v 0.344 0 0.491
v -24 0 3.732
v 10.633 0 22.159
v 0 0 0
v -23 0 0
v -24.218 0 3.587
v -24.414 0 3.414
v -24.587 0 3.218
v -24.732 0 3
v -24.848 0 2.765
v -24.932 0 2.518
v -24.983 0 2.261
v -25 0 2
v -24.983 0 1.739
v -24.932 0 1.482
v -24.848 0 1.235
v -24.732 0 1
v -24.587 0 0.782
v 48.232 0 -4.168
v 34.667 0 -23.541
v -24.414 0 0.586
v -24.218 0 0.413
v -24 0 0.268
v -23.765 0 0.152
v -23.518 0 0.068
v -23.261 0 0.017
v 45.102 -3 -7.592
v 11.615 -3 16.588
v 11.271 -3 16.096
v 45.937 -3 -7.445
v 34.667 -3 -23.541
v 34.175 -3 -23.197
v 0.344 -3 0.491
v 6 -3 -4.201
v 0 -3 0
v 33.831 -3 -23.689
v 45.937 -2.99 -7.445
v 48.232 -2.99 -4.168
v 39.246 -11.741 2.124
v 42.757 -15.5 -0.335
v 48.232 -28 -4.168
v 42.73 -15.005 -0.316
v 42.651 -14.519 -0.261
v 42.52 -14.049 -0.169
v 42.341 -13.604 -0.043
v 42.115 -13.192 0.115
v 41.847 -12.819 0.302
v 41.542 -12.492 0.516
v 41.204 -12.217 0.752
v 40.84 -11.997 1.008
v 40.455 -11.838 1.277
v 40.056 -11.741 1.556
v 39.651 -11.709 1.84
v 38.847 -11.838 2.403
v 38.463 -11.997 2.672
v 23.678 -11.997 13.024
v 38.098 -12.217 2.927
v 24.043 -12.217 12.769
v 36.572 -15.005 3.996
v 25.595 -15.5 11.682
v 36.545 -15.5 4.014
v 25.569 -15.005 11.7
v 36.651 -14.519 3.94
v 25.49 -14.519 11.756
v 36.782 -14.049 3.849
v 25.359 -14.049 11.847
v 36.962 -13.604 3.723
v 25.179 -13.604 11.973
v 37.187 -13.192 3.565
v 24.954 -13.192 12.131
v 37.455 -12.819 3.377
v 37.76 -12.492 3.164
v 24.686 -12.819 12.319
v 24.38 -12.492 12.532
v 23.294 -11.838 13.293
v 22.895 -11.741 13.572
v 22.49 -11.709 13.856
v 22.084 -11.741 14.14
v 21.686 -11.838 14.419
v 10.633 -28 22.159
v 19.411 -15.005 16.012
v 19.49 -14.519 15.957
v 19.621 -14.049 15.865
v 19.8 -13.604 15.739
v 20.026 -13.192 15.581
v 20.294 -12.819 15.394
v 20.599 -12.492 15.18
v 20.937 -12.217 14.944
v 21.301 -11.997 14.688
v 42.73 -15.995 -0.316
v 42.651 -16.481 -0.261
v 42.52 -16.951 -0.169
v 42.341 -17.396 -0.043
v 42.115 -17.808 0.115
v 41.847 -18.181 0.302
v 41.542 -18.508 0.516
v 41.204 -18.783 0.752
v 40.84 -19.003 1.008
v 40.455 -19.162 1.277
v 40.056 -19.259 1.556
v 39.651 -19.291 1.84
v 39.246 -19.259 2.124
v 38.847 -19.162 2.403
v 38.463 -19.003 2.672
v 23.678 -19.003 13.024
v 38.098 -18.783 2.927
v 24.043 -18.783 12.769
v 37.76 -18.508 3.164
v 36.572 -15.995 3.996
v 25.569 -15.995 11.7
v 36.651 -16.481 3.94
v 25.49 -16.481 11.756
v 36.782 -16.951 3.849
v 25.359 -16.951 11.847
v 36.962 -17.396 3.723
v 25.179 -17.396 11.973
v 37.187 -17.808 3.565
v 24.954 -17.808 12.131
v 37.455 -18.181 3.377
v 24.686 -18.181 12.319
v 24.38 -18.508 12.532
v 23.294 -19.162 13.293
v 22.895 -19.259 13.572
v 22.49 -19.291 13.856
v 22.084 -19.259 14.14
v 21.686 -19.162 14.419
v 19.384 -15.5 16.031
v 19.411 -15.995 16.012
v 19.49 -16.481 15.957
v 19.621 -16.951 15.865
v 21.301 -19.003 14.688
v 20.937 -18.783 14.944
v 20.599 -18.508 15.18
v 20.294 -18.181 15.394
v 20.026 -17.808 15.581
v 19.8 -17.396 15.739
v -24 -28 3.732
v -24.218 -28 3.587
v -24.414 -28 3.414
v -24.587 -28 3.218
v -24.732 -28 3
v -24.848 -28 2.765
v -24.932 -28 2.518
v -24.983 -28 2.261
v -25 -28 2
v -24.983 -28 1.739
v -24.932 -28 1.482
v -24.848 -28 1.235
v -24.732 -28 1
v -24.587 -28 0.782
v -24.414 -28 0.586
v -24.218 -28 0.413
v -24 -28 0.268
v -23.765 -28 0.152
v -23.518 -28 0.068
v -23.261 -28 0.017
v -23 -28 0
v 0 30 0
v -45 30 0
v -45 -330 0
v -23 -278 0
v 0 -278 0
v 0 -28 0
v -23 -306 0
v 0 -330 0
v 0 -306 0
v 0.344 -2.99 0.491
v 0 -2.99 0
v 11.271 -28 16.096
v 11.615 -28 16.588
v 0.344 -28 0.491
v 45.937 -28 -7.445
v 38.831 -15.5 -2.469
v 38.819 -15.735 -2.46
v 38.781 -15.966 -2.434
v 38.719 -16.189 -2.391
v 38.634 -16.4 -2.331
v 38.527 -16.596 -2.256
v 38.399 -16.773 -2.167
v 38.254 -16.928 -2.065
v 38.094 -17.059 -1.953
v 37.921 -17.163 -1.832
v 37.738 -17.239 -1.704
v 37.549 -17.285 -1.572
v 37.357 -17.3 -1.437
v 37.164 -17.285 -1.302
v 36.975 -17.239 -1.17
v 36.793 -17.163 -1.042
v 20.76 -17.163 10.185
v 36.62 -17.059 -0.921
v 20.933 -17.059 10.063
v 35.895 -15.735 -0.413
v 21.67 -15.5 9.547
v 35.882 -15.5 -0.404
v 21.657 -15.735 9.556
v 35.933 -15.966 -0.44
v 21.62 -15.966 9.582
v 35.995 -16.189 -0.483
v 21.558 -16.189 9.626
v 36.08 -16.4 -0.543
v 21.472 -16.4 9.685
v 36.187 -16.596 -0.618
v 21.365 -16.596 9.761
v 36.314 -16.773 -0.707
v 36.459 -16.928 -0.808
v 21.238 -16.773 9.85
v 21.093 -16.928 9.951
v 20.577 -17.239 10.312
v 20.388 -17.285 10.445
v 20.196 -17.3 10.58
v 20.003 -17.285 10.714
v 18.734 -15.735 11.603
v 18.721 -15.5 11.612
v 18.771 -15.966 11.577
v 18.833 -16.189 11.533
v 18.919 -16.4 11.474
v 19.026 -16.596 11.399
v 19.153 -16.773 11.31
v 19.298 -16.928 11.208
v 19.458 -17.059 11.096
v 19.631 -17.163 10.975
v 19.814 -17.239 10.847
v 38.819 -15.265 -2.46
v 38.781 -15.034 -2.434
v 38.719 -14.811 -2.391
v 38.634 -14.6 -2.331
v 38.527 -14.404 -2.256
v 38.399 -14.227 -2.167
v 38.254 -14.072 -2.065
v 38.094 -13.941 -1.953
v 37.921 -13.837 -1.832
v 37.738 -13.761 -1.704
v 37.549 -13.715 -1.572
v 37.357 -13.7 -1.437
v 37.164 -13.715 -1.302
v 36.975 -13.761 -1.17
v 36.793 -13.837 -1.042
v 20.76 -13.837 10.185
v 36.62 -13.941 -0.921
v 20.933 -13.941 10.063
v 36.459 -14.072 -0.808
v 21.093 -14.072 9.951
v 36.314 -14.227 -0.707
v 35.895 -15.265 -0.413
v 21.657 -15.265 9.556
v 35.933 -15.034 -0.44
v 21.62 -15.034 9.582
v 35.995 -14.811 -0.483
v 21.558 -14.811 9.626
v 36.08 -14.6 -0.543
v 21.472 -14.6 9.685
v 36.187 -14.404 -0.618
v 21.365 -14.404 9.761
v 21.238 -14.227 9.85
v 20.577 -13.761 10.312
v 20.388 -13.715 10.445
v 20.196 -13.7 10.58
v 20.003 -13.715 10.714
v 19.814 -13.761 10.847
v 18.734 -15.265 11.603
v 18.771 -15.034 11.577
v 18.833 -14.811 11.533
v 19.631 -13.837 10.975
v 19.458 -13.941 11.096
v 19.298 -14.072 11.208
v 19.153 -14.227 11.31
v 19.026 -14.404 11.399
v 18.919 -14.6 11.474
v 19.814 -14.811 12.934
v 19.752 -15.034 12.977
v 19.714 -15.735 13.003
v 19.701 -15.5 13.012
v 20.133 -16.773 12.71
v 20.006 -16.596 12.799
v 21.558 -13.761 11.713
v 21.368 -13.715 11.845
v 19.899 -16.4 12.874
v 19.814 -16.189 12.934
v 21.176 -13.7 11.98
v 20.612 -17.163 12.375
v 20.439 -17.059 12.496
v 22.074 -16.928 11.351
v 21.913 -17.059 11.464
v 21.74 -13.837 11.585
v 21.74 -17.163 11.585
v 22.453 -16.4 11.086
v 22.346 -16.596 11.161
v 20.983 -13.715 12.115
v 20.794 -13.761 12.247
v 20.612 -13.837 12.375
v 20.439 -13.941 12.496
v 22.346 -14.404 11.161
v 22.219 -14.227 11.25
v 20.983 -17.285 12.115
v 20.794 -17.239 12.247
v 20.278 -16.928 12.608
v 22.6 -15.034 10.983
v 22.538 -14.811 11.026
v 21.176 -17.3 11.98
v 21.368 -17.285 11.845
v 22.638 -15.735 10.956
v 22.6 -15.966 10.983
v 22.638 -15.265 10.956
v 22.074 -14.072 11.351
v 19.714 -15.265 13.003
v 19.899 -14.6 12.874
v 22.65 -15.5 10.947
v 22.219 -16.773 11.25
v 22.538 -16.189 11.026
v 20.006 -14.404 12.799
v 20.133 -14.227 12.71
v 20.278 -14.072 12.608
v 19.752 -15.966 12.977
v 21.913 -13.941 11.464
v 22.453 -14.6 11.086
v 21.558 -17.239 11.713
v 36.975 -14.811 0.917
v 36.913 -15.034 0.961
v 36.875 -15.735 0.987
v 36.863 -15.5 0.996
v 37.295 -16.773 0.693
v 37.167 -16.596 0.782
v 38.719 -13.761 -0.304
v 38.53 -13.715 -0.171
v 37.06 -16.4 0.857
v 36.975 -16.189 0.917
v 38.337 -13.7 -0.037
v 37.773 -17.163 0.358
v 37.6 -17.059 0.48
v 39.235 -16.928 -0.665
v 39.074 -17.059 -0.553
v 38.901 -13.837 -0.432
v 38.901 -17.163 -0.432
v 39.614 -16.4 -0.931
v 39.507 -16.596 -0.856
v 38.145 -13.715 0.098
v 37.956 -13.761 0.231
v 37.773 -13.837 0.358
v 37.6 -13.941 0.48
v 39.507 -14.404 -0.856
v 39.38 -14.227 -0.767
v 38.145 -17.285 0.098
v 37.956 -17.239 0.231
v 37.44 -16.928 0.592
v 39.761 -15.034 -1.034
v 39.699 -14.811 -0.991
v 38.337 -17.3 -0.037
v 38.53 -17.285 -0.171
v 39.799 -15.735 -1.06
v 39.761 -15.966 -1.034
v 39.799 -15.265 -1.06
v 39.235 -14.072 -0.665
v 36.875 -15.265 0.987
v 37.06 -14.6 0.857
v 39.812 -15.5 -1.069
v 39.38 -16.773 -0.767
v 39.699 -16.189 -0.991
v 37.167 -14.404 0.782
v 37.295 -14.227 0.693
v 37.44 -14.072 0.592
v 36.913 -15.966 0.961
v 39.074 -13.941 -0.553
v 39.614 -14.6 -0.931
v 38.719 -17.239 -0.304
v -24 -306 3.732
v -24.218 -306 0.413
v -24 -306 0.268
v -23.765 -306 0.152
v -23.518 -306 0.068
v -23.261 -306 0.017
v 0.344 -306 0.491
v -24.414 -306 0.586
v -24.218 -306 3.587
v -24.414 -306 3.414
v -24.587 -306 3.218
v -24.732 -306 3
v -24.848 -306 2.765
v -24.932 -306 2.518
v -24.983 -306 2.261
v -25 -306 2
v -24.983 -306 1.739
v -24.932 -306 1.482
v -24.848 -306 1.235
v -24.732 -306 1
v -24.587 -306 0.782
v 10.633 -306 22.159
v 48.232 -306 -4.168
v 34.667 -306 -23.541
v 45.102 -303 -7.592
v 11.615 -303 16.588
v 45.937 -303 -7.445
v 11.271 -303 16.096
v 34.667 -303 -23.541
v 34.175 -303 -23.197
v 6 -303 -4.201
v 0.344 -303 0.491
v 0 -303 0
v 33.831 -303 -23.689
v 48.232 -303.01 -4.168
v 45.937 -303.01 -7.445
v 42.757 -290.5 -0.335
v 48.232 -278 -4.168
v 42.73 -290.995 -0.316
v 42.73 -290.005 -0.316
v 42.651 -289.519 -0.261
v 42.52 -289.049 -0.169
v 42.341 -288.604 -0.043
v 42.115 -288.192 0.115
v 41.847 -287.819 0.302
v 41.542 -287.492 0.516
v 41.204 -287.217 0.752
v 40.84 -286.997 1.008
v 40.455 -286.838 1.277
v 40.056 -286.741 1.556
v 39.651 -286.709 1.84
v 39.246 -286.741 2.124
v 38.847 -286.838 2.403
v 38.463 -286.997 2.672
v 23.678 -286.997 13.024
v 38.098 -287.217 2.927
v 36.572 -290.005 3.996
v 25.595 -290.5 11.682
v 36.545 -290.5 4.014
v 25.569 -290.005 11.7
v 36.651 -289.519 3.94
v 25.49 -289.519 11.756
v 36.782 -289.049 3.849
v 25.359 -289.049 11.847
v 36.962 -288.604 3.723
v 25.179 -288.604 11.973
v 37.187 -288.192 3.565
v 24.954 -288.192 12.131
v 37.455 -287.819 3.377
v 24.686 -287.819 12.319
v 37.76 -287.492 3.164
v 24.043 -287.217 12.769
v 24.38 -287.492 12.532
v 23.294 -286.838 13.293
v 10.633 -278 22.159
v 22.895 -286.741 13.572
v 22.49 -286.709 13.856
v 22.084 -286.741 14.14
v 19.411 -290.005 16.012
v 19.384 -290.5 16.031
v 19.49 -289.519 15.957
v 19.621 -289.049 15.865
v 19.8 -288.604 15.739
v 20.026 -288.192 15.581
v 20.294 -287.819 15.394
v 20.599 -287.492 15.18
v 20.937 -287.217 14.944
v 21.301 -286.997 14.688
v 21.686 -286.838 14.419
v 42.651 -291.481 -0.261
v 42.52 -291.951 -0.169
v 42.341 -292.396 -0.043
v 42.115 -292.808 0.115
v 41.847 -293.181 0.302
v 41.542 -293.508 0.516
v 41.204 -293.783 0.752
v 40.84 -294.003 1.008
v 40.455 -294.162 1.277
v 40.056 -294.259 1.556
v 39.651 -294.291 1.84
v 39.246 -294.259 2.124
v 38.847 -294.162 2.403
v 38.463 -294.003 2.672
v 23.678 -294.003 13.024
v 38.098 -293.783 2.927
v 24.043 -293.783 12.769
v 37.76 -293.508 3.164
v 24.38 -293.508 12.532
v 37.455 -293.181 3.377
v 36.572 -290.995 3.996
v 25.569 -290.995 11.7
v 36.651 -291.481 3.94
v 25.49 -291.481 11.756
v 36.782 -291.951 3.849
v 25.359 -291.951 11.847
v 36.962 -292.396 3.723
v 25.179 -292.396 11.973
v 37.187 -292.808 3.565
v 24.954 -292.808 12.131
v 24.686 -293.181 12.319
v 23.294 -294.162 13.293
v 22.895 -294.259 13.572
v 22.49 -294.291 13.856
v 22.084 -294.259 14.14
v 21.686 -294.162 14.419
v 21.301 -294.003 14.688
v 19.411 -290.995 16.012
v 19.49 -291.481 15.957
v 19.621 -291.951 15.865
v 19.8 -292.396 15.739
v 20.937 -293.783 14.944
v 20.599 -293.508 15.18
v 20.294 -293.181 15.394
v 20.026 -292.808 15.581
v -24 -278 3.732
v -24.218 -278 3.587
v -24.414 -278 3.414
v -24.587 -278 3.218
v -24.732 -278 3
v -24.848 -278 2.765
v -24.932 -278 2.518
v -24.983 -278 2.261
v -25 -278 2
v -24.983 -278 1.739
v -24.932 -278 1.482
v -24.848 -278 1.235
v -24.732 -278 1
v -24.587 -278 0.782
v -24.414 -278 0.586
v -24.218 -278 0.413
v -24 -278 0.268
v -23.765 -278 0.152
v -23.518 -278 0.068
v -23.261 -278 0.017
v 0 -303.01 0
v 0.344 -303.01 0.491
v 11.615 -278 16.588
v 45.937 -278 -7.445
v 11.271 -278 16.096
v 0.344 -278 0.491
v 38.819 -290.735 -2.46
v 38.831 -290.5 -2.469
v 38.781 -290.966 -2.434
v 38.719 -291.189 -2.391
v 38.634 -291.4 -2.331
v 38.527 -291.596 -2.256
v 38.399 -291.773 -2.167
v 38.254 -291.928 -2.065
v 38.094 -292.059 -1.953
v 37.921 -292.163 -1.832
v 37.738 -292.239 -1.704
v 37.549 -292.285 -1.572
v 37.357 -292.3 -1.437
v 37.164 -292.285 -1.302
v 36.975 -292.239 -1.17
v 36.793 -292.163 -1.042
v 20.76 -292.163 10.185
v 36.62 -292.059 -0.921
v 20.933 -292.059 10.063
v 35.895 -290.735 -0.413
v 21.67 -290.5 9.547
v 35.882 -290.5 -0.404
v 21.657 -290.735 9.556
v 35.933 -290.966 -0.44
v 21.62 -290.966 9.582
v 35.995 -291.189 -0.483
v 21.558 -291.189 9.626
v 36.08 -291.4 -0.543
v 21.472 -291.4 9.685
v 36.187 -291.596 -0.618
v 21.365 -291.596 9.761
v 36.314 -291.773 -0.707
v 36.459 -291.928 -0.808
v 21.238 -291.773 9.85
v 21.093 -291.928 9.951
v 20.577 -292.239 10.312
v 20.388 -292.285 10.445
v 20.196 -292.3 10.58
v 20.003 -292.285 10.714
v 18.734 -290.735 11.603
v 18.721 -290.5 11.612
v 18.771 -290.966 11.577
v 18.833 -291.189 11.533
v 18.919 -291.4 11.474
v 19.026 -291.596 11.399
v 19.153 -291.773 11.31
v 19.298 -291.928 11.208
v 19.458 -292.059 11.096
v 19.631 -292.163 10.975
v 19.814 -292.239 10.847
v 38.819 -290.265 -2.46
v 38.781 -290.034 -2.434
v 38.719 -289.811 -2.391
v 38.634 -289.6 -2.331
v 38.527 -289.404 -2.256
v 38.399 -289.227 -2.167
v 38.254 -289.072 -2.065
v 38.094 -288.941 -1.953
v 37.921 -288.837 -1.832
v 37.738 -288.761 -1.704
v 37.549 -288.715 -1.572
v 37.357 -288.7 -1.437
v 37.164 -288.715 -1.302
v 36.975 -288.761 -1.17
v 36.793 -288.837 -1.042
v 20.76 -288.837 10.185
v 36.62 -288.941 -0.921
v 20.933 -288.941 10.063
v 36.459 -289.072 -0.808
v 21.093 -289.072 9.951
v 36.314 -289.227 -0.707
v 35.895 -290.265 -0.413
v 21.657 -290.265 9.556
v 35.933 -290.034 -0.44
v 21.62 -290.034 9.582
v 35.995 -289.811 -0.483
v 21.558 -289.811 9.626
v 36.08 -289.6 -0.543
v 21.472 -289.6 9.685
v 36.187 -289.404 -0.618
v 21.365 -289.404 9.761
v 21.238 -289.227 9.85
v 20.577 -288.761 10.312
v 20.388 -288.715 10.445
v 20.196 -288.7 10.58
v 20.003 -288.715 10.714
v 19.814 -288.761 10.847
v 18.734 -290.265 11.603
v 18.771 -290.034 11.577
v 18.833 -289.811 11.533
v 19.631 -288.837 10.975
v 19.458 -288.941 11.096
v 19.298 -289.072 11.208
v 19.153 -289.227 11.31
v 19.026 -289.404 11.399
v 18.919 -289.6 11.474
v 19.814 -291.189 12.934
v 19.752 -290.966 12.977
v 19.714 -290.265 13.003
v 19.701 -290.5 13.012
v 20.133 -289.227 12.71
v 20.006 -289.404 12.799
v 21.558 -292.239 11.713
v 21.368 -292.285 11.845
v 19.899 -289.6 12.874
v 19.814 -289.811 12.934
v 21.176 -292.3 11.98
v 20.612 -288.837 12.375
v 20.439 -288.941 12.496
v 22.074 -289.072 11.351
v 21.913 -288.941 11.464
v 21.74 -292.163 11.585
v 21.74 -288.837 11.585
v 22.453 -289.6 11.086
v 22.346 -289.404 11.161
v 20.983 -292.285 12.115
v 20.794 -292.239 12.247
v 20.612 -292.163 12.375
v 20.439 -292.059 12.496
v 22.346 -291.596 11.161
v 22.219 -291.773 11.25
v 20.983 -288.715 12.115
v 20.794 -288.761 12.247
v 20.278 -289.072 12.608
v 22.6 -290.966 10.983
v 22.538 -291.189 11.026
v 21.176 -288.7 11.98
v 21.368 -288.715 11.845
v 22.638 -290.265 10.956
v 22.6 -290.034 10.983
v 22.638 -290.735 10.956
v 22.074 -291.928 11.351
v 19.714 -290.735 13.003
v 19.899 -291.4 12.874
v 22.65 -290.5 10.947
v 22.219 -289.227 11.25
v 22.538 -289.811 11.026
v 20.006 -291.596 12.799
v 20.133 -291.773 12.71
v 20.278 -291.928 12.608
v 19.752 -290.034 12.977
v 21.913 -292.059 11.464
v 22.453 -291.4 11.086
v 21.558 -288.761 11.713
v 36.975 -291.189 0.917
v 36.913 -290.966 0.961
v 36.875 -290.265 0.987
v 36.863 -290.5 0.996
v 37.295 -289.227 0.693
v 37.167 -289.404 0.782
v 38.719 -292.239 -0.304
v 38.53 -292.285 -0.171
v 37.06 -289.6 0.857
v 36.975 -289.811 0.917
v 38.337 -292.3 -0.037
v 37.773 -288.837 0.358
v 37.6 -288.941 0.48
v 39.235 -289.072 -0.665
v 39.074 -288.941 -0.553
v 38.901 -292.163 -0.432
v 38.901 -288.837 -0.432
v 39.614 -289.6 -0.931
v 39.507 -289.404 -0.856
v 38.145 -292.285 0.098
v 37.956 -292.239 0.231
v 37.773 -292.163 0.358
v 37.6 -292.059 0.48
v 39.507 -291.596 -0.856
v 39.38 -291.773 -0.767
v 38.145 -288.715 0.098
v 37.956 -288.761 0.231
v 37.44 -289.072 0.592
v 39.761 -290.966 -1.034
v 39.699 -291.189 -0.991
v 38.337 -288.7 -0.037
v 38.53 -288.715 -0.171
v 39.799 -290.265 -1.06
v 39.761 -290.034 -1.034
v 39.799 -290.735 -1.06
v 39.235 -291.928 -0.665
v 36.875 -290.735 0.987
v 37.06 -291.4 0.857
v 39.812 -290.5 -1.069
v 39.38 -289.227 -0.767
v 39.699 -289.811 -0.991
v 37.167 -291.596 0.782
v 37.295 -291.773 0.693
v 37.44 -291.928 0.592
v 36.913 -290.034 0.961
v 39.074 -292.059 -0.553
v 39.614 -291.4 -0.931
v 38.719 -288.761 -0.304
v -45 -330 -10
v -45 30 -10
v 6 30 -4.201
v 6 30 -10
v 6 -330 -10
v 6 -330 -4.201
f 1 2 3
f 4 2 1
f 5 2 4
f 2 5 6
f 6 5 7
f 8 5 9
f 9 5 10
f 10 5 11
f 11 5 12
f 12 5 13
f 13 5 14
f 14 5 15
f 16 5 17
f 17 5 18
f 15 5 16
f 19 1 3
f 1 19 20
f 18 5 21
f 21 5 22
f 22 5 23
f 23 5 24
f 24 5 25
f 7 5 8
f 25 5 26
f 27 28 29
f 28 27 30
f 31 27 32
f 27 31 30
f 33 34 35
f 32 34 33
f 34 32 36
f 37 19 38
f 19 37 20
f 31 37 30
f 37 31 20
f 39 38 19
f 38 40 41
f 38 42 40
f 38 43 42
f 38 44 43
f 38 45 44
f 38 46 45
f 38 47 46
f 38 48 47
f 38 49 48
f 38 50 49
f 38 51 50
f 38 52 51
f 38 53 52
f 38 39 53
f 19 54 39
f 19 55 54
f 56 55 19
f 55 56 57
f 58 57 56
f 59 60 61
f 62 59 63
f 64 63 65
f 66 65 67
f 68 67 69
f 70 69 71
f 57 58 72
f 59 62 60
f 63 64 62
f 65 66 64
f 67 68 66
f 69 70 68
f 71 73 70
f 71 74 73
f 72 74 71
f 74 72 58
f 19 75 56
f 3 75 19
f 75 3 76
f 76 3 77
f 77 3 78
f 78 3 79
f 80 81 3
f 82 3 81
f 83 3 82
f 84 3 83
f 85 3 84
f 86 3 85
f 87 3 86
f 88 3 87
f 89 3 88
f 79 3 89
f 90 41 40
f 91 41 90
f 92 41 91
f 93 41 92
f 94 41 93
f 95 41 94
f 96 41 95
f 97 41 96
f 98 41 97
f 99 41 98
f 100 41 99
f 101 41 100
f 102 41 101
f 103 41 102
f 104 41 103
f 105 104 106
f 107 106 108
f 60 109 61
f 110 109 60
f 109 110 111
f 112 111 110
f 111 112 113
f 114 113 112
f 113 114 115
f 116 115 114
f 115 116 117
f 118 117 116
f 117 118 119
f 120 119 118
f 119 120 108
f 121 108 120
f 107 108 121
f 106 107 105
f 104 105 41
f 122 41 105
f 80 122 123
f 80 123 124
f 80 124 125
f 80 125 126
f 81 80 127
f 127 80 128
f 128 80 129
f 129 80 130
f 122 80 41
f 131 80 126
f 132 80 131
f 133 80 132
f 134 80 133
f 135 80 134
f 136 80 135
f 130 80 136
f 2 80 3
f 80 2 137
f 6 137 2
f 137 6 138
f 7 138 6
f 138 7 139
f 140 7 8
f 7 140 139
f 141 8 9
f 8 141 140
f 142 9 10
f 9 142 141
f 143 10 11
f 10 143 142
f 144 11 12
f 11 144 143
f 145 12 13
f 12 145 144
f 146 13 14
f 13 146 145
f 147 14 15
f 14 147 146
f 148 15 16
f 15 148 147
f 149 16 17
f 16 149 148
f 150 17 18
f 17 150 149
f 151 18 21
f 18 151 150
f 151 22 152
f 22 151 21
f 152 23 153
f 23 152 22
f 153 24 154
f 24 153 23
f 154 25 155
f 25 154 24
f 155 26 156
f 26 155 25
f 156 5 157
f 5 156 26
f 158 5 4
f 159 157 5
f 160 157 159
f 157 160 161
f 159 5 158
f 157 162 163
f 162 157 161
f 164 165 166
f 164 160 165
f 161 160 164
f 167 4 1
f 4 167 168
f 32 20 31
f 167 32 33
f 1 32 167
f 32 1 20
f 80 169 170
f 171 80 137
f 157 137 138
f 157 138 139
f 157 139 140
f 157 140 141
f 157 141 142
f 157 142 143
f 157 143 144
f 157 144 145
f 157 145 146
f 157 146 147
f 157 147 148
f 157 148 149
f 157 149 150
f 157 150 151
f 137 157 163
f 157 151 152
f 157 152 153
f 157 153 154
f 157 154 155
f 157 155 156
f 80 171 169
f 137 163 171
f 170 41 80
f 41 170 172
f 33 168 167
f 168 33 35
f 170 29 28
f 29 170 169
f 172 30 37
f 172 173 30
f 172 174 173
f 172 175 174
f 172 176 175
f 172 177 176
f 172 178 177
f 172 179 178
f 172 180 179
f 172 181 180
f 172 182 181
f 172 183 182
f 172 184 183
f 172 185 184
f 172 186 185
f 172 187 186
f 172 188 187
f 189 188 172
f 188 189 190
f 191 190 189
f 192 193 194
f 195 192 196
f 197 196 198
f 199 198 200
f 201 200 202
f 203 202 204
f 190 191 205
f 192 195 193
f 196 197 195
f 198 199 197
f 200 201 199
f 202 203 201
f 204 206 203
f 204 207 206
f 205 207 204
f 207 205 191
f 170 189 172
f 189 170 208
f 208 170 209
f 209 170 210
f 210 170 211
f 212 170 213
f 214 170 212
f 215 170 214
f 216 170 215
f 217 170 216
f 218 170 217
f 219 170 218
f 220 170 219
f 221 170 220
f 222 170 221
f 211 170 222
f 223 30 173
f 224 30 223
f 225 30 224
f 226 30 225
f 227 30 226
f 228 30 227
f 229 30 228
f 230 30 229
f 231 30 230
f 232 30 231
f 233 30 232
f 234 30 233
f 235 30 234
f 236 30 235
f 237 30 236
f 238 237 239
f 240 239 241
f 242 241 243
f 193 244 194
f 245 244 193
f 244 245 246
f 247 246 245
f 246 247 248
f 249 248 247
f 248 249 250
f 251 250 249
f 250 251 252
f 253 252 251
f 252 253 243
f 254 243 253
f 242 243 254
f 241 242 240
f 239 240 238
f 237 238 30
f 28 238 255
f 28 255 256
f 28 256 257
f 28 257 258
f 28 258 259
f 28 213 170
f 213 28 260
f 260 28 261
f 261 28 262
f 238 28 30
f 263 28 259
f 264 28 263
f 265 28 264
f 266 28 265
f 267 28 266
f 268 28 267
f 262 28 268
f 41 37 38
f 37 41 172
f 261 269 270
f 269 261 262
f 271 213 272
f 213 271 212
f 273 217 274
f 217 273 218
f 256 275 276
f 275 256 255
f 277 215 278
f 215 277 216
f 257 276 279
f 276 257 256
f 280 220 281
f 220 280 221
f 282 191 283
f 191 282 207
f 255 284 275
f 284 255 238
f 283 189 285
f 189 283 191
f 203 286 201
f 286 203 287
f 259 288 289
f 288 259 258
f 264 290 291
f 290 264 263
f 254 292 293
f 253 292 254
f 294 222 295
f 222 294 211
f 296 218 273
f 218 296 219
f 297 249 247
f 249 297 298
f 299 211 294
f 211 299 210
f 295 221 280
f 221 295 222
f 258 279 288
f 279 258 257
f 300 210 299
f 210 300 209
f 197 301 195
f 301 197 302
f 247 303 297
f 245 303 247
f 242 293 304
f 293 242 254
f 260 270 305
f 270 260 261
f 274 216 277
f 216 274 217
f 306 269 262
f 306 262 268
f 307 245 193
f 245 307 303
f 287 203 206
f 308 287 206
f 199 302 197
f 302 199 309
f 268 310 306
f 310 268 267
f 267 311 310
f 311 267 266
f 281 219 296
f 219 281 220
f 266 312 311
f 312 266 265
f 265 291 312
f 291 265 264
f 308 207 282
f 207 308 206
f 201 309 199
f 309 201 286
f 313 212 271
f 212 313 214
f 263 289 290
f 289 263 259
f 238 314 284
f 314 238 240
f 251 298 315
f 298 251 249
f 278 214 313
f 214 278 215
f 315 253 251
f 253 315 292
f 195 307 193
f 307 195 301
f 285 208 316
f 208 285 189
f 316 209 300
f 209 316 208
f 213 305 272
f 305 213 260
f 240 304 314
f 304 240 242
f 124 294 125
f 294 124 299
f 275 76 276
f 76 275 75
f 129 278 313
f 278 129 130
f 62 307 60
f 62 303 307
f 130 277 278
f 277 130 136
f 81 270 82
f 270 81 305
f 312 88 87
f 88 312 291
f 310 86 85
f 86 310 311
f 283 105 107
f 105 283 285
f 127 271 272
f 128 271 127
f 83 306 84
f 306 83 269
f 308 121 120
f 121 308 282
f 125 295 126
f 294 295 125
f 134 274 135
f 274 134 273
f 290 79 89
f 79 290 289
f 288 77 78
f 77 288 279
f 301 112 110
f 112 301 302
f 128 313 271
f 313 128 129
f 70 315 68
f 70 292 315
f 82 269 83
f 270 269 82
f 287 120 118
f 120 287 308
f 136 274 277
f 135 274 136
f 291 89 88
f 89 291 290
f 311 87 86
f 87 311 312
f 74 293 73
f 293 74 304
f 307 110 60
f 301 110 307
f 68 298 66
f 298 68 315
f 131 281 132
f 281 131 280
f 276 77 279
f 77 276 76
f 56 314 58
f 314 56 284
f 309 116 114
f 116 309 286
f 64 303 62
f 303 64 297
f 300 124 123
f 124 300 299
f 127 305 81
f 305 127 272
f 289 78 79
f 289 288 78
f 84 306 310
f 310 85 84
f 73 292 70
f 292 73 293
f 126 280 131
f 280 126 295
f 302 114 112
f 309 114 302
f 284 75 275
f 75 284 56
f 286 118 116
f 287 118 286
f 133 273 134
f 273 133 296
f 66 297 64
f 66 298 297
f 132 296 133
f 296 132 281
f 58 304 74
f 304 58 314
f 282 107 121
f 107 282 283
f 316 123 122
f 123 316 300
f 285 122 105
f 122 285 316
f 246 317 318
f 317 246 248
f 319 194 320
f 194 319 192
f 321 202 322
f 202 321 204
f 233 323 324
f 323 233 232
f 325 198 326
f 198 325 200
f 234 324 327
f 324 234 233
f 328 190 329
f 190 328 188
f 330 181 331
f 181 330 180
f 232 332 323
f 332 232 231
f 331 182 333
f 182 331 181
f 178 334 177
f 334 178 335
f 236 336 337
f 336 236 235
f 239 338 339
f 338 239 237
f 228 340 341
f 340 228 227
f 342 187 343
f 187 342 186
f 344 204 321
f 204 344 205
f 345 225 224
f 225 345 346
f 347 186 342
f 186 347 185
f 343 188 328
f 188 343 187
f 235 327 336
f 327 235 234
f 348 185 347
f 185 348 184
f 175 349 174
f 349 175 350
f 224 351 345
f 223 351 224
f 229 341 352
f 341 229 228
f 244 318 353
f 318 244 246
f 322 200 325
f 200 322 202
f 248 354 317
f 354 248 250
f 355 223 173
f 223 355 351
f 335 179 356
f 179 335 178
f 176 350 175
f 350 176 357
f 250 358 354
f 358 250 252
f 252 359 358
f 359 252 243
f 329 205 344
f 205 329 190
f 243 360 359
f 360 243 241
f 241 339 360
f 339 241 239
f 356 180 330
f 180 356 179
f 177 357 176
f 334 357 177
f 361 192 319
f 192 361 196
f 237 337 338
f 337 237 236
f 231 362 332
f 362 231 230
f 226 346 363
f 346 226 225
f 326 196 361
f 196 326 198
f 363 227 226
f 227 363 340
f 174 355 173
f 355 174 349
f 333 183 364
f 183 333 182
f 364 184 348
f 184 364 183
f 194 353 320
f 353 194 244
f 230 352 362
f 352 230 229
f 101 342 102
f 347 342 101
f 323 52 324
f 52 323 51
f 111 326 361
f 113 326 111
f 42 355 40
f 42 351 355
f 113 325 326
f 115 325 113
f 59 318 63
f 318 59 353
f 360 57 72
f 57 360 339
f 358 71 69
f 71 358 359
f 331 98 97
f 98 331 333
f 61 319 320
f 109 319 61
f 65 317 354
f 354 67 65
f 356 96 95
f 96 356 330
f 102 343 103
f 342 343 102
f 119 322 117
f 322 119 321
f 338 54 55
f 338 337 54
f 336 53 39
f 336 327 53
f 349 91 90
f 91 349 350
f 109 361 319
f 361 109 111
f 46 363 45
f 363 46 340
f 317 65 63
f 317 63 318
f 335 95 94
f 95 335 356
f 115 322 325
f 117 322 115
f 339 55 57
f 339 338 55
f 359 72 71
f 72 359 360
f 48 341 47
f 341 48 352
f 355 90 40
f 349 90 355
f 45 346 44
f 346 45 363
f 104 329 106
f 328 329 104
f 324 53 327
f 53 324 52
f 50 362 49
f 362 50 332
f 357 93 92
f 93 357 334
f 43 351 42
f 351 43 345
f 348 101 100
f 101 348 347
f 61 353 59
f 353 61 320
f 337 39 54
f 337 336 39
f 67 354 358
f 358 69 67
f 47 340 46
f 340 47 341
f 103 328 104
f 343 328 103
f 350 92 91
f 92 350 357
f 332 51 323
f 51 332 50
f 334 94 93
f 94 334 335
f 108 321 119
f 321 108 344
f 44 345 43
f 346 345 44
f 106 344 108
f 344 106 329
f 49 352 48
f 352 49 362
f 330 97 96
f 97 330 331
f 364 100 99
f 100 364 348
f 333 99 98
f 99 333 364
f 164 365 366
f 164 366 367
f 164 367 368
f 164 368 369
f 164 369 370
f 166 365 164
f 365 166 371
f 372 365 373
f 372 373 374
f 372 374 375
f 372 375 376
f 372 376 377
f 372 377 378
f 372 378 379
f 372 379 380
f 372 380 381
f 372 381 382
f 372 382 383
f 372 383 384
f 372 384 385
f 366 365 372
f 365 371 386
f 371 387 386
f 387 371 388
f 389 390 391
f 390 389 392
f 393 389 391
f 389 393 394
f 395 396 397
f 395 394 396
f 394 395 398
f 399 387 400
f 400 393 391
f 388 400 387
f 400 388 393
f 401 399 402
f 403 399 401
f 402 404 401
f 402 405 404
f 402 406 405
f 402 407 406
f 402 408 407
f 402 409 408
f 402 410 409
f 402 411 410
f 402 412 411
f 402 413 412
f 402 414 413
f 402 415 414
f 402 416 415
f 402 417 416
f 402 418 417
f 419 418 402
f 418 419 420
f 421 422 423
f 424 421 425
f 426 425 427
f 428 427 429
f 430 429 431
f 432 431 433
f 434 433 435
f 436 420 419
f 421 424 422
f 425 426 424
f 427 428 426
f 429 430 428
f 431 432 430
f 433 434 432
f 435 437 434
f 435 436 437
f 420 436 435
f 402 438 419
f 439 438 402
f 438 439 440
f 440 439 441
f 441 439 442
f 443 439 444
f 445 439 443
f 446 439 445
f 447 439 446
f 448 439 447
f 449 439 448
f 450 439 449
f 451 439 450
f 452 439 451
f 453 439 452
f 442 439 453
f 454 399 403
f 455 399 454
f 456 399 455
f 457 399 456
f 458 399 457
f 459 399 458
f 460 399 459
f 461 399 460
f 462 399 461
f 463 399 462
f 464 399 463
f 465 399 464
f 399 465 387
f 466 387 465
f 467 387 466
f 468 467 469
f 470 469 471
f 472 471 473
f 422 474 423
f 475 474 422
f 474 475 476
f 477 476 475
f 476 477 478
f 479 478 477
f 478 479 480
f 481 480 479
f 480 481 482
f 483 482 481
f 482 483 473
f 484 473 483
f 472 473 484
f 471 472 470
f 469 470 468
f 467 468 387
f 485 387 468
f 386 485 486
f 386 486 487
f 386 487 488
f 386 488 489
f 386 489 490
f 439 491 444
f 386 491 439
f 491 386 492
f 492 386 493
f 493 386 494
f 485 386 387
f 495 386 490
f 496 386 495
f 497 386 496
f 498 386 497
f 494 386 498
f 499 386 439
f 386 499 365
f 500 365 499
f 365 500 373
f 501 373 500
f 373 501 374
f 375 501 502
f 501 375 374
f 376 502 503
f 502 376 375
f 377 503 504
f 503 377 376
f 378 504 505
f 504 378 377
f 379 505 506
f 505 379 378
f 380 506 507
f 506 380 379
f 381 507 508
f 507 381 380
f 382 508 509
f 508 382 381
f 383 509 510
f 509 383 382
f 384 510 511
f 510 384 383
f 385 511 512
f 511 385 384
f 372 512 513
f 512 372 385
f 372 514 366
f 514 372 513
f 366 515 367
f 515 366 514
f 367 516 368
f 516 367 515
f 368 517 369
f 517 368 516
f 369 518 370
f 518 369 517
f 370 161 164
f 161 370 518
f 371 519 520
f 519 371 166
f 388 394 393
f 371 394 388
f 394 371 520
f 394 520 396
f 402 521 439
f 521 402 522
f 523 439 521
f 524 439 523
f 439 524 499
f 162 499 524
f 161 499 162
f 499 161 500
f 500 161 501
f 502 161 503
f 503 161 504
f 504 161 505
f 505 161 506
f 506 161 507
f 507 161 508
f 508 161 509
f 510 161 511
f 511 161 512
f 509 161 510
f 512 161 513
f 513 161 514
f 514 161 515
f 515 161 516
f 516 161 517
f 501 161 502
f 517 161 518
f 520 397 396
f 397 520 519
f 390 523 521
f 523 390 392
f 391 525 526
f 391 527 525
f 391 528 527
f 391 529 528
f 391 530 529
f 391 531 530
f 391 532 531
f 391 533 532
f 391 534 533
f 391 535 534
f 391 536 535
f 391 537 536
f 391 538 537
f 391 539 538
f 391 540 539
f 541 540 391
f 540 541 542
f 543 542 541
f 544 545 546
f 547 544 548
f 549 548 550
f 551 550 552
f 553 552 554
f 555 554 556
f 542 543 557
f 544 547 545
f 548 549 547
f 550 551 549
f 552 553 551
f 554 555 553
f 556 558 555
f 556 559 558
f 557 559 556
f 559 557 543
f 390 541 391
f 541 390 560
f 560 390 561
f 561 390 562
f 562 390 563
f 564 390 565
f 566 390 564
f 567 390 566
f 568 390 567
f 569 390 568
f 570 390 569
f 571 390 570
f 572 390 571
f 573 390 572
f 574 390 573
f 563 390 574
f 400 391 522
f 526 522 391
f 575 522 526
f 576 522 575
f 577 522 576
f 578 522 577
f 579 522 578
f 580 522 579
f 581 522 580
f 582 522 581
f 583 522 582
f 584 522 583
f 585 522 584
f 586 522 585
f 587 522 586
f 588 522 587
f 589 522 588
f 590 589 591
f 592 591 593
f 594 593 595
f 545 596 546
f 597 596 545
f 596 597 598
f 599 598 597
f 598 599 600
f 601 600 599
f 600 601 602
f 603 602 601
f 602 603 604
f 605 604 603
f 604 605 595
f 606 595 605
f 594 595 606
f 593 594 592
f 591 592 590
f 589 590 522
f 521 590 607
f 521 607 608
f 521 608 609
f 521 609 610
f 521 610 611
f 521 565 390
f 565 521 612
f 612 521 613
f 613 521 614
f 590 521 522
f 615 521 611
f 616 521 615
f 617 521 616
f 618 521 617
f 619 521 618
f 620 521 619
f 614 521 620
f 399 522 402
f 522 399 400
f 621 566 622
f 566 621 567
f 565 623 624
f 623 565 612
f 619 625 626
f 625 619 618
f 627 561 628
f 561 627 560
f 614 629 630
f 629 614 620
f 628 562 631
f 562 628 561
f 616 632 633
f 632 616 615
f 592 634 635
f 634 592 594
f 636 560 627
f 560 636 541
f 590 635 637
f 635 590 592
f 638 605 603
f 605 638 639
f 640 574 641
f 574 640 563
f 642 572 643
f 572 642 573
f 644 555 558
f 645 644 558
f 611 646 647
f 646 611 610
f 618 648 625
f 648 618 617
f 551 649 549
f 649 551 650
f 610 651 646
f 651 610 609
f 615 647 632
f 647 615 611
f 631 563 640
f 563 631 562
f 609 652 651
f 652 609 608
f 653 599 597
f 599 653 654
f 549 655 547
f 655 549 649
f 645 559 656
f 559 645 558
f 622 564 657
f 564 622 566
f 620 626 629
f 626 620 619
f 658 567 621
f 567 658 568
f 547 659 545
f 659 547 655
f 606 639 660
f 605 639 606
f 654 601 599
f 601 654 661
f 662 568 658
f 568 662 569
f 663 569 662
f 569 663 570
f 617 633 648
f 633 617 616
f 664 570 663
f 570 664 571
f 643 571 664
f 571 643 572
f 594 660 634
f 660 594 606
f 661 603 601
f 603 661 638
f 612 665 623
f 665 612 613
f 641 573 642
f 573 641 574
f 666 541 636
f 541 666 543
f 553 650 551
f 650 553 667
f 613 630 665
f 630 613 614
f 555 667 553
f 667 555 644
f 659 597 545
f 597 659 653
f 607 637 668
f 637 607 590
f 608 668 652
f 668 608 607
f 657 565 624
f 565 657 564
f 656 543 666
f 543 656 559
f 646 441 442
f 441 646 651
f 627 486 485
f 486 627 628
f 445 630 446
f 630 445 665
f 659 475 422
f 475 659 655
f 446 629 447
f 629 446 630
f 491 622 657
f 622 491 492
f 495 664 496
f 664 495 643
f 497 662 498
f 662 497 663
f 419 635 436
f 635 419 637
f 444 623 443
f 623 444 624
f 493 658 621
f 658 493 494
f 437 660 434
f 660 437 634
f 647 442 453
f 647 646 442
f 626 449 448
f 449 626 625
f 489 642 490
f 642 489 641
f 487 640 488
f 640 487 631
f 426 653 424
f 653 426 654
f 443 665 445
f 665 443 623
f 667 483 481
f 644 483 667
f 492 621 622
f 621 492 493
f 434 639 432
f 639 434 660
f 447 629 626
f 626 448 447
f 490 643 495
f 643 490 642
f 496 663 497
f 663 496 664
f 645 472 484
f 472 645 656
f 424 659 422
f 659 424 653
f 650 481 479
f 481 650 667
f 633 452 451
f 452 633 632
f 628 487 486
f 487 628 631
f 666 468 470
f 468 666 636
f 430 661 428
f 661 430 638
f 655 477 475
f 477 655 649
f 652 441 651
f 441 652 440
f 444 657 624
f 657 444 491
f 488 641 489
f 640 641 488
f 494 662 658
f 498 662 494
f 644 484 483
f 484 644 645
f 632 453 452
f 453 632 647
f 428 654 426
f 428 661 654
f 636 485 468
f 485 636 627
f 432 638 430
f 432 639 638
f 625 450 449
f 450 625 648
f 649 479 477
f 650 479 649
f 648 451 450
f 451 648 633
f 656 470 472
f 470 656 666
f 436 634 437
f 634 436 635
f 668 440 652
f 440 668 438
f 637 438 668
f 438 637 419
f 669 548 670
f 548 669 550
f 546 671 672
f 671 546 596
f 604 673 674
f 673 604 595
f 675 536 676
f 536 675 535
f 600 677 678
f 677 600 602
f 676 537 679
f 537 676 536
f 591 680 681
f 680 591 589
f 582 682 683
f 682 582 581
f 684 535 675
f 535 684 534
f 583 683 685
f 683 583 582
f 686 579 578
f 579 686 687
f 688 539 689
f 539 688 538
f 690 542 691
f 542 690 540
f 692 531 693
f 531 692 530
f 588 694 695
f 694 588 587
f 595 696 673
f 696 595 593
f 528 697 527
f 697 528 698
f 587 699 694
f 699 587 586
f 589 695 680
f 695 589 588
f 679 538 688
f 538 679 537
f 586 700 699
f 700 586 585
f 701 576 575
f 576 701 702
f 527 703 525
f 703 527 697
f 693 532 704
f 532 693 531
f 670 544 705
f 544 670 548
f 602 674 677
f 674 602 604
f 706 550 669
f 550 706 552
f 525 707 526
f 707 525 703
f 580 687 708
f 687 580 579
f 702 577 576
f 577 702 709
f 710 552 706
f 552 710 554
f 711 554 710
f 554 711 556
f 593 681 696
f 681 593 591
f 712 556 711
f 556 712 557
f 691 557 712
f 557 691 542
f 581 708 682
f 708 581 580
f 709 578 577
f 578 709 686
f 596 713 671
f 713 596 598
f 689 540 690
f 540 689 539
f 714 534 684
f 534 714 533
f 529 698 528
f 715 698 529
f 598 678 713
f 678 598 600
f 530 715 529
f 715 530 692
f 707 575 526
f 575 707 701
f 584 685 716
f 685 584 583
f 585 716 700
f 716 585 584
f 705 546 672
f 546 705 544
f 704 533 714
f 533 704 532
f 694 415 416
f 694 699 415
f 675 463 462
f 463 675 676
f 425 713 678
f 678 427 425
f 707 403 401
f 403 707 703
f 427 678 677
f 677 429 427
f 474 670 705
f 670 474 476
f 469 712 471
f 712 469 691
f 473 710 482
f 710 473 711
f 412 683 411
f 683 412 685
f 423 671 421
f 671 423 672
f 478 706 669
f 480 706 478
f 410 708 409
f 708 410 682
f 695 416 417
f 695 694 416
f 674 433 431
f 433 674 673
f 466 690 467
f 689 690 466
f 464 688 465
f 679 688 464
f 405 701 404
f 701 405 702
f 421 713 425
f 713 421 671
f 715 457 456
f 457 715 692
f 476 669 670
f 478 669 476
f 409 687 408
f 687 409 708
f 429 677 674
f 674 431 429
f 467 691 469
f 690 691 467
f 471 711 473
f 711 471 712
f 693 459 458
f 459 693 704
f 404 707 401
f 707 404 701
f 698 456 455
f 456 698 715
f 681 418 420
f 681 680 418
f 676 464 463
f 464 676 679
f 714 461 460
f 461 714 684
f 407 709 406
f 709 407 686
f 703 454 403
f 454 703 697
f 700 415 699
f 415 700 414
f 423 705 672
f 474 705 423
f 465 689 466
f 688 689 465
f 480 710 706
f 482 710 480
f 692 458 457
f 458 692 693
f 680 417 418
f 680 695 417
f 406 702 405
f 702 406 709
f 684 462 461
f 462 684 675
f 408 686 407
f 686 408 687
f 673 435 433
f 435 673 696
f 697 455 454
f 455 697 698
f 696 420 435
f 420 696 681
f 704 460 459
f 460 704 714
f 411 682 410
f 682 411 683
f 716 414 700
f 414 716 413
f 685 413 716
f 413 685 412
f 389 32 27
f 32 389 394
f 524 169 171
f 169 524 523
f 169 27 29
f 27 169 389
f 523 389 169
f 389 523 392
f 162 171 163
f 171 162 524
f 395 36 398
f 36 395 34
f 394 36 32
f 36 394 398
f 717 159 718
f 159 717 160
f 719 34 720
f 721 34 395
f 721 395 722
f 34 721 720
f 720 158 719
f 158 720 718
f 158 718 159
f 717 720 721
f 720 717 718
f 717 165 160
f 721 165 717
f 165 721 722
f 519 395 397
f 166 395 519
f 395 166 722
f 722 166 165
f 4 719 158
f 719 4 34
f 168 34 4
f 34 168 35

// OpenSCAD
// file: bevel-sander.scad
// End brackets that turn a furring strip into a 35-degree bevel sanding block.
//
// End view (looking along the strip):
//
//            ______
//           /     /|   <- back flange, screwed to the back of the strip
//          / wood/ |
//    _____/_____/  |   <- the strip; sandpaper glued on its front face
//   |  foot   V \
//   ‾‾‾‾‾‾‾‾‾‾‾‾‾‾\    <- sanding face, 35 deg below the foot plane
//
// The foot rides flat on the foam's face; the sandpaper meets it at V with a
// 145-degree open angle, so the sanded surface ends up 35 degrees off the face.
// Units: mm. Print one "left" and one "right" (mirror images), end cap down.

/* [Wood strip] */
wood_width = 41.3;      // the face that carries sandpaper (1 5/8 in)
wood_thickness = 19.05; // (0.75 in)
wood_clearance = 0.6;   // total, added to both pocket dimensions
paper_thickness = 0.6;  // sandpaper (plus glue) on the front face

/* [Geometry] */
bevel_angle = 35;       // between the foam face and the sanded bevel
foot_length = 25;       // contact on the foam face, measured from V
foot_thickness = 4;
wall = 4;               // inner-edge wall and back flange
bracket_length = 25;    // along the strip, from the wood's end
end_cap = 3;            // plate over the wood's end grain; 0 for none
nose_radius = 2;        // round on the foot's trailing edge

/* [Screws] */
screw_d = 3.6;          // clearance for #6 wood screws
head_d = 7.6;           // 82-degree countersink diameter at the surface

side = "left";          // [left, right]
build = true;           // preview.scad turns this off to place its own copies

$fn = 48;

d = [cos(bevel_angle), -sin(bevel_angle)];  // down the sanding face, away from the foot
n = [sin(bevel_angle), cos(bevel_angle)];   // out of the sanding face, into the block
ww = wood_width + wood_clearance;
wt = wood_thickness + wood_clearance;
o = paper_thickness * n;                    // front-inner corner of the wood pocket

function at(u, v) = o + u * d + v * n;      // strip-local coordinates -> profile

// Wood pocket; front face (v < 0) left open past the sanding plane.
module pocket() polygon([at(0, -5), at(ww + 5, -5), at(ww + 5, wt), at(0, wt)]);

module profile() {
    difference() {
        union() {
            // Foot plus the gusset up to the top of the inner-edge wall.
            hull() {
                translate([-foot_length + nose_radius, nose_radius]) circle(nose_radius);
                translate([-foot_length + nose_radius, 0]) square([foot_length - nose_radius, foot_thickness]);
                polygon([[0, 0], at(0, 0), at(0, wt + wall), at(-wall, wt + wall), at(-wall, 0)]);
            }
            // Back flange across the full width of the strip.
            polygon([at(-wall, wt), at(ww, wt), at(ww, wt + wall), at(-wall, wt + wall)]);
        }
        pocket();
    }
}

// Same outline, closed over the pocket: the end cap.
module cap_profile() {
    union() {
        profile();
        polygon([at(0, 0), at(ww, 0), at(ww, wt), at(0, wt)]);
    }
}

module screw_hole(u) {
    // Placed on the flange's outer face, drilled along -n into the wood.
    p = at(u, wt + wall);
    a = atan2(n[1], n[0]);
    translate([p[0], p[1], end_cap + bracket_length / 2])
        rotate([0, 0, a]) rotate([0, -90, 0]) {
            translate([0, 0, -1]) cylinder(d = screw_d, h = wall + 2);
            translate([0, 0, -0.01]) cylinder(d1 = head_d, d2 = 0, h = head_d / 2 / tan(41));
            translate([0, 0, -5]) cylinder(d = head_d, h = 5);
        }
}

module bracket() {
    difference() {
        union() {
            if (end_cap > 0) linear_extrude(end_cap) cap_profile();
            translate([0, 0, end_cap - 0.01]) linear_extrude(bracket_length + 0.01) profile();
        }
        for (u = [ww / 4, 3 * ww / 4]) screw_hole(u);
    }
}

// Printed with the end cap on the bed (Z = 0); Z runs along the strip.
if (build) {
    if (side == "right") mirror([1, 0, 0]) bracket();
    else bracket();
}
// main file
// Preview only: two brackets on a 300 mm strip, finishing a bevel on 10 mm foam.
include <bevel-sander.scad>
build = false;
strip = 300;
view = "3d";  // [3d, end]
foam = 10;
module wood() color("burlywood") translate([0, 0, end_cap]) linear_extrude(strip)
    polygon([at(0, 0), at(wood_width, 0), at(wood_width, wood_thickness), at(0, wood_thickness)]);
module paper() color("dimgray") translate([0, 0, end_cap]) linear_extrude(strip)
    polygon([[0, 0], d * wood_width, o + d * wood_width, o]);
module blade() color("lightgreen") translate([0, 0, -30]) linear_extrude(strip + 60)
    polygon([[-45, 0], [0, 0], [6, -6 * tan(bevel_angle)], [6, -foam], [-45, -foam]]);
module scene() {
    color("orange") bracket();
    color("orange") translate([0, 0, strip + 2 * end_cap]) mirror([0, 0, 1]) bracket();
    wood(); paper(); blade();
}
if (view == "end") scene(); else rotate([90, 0, 0]) scene();
